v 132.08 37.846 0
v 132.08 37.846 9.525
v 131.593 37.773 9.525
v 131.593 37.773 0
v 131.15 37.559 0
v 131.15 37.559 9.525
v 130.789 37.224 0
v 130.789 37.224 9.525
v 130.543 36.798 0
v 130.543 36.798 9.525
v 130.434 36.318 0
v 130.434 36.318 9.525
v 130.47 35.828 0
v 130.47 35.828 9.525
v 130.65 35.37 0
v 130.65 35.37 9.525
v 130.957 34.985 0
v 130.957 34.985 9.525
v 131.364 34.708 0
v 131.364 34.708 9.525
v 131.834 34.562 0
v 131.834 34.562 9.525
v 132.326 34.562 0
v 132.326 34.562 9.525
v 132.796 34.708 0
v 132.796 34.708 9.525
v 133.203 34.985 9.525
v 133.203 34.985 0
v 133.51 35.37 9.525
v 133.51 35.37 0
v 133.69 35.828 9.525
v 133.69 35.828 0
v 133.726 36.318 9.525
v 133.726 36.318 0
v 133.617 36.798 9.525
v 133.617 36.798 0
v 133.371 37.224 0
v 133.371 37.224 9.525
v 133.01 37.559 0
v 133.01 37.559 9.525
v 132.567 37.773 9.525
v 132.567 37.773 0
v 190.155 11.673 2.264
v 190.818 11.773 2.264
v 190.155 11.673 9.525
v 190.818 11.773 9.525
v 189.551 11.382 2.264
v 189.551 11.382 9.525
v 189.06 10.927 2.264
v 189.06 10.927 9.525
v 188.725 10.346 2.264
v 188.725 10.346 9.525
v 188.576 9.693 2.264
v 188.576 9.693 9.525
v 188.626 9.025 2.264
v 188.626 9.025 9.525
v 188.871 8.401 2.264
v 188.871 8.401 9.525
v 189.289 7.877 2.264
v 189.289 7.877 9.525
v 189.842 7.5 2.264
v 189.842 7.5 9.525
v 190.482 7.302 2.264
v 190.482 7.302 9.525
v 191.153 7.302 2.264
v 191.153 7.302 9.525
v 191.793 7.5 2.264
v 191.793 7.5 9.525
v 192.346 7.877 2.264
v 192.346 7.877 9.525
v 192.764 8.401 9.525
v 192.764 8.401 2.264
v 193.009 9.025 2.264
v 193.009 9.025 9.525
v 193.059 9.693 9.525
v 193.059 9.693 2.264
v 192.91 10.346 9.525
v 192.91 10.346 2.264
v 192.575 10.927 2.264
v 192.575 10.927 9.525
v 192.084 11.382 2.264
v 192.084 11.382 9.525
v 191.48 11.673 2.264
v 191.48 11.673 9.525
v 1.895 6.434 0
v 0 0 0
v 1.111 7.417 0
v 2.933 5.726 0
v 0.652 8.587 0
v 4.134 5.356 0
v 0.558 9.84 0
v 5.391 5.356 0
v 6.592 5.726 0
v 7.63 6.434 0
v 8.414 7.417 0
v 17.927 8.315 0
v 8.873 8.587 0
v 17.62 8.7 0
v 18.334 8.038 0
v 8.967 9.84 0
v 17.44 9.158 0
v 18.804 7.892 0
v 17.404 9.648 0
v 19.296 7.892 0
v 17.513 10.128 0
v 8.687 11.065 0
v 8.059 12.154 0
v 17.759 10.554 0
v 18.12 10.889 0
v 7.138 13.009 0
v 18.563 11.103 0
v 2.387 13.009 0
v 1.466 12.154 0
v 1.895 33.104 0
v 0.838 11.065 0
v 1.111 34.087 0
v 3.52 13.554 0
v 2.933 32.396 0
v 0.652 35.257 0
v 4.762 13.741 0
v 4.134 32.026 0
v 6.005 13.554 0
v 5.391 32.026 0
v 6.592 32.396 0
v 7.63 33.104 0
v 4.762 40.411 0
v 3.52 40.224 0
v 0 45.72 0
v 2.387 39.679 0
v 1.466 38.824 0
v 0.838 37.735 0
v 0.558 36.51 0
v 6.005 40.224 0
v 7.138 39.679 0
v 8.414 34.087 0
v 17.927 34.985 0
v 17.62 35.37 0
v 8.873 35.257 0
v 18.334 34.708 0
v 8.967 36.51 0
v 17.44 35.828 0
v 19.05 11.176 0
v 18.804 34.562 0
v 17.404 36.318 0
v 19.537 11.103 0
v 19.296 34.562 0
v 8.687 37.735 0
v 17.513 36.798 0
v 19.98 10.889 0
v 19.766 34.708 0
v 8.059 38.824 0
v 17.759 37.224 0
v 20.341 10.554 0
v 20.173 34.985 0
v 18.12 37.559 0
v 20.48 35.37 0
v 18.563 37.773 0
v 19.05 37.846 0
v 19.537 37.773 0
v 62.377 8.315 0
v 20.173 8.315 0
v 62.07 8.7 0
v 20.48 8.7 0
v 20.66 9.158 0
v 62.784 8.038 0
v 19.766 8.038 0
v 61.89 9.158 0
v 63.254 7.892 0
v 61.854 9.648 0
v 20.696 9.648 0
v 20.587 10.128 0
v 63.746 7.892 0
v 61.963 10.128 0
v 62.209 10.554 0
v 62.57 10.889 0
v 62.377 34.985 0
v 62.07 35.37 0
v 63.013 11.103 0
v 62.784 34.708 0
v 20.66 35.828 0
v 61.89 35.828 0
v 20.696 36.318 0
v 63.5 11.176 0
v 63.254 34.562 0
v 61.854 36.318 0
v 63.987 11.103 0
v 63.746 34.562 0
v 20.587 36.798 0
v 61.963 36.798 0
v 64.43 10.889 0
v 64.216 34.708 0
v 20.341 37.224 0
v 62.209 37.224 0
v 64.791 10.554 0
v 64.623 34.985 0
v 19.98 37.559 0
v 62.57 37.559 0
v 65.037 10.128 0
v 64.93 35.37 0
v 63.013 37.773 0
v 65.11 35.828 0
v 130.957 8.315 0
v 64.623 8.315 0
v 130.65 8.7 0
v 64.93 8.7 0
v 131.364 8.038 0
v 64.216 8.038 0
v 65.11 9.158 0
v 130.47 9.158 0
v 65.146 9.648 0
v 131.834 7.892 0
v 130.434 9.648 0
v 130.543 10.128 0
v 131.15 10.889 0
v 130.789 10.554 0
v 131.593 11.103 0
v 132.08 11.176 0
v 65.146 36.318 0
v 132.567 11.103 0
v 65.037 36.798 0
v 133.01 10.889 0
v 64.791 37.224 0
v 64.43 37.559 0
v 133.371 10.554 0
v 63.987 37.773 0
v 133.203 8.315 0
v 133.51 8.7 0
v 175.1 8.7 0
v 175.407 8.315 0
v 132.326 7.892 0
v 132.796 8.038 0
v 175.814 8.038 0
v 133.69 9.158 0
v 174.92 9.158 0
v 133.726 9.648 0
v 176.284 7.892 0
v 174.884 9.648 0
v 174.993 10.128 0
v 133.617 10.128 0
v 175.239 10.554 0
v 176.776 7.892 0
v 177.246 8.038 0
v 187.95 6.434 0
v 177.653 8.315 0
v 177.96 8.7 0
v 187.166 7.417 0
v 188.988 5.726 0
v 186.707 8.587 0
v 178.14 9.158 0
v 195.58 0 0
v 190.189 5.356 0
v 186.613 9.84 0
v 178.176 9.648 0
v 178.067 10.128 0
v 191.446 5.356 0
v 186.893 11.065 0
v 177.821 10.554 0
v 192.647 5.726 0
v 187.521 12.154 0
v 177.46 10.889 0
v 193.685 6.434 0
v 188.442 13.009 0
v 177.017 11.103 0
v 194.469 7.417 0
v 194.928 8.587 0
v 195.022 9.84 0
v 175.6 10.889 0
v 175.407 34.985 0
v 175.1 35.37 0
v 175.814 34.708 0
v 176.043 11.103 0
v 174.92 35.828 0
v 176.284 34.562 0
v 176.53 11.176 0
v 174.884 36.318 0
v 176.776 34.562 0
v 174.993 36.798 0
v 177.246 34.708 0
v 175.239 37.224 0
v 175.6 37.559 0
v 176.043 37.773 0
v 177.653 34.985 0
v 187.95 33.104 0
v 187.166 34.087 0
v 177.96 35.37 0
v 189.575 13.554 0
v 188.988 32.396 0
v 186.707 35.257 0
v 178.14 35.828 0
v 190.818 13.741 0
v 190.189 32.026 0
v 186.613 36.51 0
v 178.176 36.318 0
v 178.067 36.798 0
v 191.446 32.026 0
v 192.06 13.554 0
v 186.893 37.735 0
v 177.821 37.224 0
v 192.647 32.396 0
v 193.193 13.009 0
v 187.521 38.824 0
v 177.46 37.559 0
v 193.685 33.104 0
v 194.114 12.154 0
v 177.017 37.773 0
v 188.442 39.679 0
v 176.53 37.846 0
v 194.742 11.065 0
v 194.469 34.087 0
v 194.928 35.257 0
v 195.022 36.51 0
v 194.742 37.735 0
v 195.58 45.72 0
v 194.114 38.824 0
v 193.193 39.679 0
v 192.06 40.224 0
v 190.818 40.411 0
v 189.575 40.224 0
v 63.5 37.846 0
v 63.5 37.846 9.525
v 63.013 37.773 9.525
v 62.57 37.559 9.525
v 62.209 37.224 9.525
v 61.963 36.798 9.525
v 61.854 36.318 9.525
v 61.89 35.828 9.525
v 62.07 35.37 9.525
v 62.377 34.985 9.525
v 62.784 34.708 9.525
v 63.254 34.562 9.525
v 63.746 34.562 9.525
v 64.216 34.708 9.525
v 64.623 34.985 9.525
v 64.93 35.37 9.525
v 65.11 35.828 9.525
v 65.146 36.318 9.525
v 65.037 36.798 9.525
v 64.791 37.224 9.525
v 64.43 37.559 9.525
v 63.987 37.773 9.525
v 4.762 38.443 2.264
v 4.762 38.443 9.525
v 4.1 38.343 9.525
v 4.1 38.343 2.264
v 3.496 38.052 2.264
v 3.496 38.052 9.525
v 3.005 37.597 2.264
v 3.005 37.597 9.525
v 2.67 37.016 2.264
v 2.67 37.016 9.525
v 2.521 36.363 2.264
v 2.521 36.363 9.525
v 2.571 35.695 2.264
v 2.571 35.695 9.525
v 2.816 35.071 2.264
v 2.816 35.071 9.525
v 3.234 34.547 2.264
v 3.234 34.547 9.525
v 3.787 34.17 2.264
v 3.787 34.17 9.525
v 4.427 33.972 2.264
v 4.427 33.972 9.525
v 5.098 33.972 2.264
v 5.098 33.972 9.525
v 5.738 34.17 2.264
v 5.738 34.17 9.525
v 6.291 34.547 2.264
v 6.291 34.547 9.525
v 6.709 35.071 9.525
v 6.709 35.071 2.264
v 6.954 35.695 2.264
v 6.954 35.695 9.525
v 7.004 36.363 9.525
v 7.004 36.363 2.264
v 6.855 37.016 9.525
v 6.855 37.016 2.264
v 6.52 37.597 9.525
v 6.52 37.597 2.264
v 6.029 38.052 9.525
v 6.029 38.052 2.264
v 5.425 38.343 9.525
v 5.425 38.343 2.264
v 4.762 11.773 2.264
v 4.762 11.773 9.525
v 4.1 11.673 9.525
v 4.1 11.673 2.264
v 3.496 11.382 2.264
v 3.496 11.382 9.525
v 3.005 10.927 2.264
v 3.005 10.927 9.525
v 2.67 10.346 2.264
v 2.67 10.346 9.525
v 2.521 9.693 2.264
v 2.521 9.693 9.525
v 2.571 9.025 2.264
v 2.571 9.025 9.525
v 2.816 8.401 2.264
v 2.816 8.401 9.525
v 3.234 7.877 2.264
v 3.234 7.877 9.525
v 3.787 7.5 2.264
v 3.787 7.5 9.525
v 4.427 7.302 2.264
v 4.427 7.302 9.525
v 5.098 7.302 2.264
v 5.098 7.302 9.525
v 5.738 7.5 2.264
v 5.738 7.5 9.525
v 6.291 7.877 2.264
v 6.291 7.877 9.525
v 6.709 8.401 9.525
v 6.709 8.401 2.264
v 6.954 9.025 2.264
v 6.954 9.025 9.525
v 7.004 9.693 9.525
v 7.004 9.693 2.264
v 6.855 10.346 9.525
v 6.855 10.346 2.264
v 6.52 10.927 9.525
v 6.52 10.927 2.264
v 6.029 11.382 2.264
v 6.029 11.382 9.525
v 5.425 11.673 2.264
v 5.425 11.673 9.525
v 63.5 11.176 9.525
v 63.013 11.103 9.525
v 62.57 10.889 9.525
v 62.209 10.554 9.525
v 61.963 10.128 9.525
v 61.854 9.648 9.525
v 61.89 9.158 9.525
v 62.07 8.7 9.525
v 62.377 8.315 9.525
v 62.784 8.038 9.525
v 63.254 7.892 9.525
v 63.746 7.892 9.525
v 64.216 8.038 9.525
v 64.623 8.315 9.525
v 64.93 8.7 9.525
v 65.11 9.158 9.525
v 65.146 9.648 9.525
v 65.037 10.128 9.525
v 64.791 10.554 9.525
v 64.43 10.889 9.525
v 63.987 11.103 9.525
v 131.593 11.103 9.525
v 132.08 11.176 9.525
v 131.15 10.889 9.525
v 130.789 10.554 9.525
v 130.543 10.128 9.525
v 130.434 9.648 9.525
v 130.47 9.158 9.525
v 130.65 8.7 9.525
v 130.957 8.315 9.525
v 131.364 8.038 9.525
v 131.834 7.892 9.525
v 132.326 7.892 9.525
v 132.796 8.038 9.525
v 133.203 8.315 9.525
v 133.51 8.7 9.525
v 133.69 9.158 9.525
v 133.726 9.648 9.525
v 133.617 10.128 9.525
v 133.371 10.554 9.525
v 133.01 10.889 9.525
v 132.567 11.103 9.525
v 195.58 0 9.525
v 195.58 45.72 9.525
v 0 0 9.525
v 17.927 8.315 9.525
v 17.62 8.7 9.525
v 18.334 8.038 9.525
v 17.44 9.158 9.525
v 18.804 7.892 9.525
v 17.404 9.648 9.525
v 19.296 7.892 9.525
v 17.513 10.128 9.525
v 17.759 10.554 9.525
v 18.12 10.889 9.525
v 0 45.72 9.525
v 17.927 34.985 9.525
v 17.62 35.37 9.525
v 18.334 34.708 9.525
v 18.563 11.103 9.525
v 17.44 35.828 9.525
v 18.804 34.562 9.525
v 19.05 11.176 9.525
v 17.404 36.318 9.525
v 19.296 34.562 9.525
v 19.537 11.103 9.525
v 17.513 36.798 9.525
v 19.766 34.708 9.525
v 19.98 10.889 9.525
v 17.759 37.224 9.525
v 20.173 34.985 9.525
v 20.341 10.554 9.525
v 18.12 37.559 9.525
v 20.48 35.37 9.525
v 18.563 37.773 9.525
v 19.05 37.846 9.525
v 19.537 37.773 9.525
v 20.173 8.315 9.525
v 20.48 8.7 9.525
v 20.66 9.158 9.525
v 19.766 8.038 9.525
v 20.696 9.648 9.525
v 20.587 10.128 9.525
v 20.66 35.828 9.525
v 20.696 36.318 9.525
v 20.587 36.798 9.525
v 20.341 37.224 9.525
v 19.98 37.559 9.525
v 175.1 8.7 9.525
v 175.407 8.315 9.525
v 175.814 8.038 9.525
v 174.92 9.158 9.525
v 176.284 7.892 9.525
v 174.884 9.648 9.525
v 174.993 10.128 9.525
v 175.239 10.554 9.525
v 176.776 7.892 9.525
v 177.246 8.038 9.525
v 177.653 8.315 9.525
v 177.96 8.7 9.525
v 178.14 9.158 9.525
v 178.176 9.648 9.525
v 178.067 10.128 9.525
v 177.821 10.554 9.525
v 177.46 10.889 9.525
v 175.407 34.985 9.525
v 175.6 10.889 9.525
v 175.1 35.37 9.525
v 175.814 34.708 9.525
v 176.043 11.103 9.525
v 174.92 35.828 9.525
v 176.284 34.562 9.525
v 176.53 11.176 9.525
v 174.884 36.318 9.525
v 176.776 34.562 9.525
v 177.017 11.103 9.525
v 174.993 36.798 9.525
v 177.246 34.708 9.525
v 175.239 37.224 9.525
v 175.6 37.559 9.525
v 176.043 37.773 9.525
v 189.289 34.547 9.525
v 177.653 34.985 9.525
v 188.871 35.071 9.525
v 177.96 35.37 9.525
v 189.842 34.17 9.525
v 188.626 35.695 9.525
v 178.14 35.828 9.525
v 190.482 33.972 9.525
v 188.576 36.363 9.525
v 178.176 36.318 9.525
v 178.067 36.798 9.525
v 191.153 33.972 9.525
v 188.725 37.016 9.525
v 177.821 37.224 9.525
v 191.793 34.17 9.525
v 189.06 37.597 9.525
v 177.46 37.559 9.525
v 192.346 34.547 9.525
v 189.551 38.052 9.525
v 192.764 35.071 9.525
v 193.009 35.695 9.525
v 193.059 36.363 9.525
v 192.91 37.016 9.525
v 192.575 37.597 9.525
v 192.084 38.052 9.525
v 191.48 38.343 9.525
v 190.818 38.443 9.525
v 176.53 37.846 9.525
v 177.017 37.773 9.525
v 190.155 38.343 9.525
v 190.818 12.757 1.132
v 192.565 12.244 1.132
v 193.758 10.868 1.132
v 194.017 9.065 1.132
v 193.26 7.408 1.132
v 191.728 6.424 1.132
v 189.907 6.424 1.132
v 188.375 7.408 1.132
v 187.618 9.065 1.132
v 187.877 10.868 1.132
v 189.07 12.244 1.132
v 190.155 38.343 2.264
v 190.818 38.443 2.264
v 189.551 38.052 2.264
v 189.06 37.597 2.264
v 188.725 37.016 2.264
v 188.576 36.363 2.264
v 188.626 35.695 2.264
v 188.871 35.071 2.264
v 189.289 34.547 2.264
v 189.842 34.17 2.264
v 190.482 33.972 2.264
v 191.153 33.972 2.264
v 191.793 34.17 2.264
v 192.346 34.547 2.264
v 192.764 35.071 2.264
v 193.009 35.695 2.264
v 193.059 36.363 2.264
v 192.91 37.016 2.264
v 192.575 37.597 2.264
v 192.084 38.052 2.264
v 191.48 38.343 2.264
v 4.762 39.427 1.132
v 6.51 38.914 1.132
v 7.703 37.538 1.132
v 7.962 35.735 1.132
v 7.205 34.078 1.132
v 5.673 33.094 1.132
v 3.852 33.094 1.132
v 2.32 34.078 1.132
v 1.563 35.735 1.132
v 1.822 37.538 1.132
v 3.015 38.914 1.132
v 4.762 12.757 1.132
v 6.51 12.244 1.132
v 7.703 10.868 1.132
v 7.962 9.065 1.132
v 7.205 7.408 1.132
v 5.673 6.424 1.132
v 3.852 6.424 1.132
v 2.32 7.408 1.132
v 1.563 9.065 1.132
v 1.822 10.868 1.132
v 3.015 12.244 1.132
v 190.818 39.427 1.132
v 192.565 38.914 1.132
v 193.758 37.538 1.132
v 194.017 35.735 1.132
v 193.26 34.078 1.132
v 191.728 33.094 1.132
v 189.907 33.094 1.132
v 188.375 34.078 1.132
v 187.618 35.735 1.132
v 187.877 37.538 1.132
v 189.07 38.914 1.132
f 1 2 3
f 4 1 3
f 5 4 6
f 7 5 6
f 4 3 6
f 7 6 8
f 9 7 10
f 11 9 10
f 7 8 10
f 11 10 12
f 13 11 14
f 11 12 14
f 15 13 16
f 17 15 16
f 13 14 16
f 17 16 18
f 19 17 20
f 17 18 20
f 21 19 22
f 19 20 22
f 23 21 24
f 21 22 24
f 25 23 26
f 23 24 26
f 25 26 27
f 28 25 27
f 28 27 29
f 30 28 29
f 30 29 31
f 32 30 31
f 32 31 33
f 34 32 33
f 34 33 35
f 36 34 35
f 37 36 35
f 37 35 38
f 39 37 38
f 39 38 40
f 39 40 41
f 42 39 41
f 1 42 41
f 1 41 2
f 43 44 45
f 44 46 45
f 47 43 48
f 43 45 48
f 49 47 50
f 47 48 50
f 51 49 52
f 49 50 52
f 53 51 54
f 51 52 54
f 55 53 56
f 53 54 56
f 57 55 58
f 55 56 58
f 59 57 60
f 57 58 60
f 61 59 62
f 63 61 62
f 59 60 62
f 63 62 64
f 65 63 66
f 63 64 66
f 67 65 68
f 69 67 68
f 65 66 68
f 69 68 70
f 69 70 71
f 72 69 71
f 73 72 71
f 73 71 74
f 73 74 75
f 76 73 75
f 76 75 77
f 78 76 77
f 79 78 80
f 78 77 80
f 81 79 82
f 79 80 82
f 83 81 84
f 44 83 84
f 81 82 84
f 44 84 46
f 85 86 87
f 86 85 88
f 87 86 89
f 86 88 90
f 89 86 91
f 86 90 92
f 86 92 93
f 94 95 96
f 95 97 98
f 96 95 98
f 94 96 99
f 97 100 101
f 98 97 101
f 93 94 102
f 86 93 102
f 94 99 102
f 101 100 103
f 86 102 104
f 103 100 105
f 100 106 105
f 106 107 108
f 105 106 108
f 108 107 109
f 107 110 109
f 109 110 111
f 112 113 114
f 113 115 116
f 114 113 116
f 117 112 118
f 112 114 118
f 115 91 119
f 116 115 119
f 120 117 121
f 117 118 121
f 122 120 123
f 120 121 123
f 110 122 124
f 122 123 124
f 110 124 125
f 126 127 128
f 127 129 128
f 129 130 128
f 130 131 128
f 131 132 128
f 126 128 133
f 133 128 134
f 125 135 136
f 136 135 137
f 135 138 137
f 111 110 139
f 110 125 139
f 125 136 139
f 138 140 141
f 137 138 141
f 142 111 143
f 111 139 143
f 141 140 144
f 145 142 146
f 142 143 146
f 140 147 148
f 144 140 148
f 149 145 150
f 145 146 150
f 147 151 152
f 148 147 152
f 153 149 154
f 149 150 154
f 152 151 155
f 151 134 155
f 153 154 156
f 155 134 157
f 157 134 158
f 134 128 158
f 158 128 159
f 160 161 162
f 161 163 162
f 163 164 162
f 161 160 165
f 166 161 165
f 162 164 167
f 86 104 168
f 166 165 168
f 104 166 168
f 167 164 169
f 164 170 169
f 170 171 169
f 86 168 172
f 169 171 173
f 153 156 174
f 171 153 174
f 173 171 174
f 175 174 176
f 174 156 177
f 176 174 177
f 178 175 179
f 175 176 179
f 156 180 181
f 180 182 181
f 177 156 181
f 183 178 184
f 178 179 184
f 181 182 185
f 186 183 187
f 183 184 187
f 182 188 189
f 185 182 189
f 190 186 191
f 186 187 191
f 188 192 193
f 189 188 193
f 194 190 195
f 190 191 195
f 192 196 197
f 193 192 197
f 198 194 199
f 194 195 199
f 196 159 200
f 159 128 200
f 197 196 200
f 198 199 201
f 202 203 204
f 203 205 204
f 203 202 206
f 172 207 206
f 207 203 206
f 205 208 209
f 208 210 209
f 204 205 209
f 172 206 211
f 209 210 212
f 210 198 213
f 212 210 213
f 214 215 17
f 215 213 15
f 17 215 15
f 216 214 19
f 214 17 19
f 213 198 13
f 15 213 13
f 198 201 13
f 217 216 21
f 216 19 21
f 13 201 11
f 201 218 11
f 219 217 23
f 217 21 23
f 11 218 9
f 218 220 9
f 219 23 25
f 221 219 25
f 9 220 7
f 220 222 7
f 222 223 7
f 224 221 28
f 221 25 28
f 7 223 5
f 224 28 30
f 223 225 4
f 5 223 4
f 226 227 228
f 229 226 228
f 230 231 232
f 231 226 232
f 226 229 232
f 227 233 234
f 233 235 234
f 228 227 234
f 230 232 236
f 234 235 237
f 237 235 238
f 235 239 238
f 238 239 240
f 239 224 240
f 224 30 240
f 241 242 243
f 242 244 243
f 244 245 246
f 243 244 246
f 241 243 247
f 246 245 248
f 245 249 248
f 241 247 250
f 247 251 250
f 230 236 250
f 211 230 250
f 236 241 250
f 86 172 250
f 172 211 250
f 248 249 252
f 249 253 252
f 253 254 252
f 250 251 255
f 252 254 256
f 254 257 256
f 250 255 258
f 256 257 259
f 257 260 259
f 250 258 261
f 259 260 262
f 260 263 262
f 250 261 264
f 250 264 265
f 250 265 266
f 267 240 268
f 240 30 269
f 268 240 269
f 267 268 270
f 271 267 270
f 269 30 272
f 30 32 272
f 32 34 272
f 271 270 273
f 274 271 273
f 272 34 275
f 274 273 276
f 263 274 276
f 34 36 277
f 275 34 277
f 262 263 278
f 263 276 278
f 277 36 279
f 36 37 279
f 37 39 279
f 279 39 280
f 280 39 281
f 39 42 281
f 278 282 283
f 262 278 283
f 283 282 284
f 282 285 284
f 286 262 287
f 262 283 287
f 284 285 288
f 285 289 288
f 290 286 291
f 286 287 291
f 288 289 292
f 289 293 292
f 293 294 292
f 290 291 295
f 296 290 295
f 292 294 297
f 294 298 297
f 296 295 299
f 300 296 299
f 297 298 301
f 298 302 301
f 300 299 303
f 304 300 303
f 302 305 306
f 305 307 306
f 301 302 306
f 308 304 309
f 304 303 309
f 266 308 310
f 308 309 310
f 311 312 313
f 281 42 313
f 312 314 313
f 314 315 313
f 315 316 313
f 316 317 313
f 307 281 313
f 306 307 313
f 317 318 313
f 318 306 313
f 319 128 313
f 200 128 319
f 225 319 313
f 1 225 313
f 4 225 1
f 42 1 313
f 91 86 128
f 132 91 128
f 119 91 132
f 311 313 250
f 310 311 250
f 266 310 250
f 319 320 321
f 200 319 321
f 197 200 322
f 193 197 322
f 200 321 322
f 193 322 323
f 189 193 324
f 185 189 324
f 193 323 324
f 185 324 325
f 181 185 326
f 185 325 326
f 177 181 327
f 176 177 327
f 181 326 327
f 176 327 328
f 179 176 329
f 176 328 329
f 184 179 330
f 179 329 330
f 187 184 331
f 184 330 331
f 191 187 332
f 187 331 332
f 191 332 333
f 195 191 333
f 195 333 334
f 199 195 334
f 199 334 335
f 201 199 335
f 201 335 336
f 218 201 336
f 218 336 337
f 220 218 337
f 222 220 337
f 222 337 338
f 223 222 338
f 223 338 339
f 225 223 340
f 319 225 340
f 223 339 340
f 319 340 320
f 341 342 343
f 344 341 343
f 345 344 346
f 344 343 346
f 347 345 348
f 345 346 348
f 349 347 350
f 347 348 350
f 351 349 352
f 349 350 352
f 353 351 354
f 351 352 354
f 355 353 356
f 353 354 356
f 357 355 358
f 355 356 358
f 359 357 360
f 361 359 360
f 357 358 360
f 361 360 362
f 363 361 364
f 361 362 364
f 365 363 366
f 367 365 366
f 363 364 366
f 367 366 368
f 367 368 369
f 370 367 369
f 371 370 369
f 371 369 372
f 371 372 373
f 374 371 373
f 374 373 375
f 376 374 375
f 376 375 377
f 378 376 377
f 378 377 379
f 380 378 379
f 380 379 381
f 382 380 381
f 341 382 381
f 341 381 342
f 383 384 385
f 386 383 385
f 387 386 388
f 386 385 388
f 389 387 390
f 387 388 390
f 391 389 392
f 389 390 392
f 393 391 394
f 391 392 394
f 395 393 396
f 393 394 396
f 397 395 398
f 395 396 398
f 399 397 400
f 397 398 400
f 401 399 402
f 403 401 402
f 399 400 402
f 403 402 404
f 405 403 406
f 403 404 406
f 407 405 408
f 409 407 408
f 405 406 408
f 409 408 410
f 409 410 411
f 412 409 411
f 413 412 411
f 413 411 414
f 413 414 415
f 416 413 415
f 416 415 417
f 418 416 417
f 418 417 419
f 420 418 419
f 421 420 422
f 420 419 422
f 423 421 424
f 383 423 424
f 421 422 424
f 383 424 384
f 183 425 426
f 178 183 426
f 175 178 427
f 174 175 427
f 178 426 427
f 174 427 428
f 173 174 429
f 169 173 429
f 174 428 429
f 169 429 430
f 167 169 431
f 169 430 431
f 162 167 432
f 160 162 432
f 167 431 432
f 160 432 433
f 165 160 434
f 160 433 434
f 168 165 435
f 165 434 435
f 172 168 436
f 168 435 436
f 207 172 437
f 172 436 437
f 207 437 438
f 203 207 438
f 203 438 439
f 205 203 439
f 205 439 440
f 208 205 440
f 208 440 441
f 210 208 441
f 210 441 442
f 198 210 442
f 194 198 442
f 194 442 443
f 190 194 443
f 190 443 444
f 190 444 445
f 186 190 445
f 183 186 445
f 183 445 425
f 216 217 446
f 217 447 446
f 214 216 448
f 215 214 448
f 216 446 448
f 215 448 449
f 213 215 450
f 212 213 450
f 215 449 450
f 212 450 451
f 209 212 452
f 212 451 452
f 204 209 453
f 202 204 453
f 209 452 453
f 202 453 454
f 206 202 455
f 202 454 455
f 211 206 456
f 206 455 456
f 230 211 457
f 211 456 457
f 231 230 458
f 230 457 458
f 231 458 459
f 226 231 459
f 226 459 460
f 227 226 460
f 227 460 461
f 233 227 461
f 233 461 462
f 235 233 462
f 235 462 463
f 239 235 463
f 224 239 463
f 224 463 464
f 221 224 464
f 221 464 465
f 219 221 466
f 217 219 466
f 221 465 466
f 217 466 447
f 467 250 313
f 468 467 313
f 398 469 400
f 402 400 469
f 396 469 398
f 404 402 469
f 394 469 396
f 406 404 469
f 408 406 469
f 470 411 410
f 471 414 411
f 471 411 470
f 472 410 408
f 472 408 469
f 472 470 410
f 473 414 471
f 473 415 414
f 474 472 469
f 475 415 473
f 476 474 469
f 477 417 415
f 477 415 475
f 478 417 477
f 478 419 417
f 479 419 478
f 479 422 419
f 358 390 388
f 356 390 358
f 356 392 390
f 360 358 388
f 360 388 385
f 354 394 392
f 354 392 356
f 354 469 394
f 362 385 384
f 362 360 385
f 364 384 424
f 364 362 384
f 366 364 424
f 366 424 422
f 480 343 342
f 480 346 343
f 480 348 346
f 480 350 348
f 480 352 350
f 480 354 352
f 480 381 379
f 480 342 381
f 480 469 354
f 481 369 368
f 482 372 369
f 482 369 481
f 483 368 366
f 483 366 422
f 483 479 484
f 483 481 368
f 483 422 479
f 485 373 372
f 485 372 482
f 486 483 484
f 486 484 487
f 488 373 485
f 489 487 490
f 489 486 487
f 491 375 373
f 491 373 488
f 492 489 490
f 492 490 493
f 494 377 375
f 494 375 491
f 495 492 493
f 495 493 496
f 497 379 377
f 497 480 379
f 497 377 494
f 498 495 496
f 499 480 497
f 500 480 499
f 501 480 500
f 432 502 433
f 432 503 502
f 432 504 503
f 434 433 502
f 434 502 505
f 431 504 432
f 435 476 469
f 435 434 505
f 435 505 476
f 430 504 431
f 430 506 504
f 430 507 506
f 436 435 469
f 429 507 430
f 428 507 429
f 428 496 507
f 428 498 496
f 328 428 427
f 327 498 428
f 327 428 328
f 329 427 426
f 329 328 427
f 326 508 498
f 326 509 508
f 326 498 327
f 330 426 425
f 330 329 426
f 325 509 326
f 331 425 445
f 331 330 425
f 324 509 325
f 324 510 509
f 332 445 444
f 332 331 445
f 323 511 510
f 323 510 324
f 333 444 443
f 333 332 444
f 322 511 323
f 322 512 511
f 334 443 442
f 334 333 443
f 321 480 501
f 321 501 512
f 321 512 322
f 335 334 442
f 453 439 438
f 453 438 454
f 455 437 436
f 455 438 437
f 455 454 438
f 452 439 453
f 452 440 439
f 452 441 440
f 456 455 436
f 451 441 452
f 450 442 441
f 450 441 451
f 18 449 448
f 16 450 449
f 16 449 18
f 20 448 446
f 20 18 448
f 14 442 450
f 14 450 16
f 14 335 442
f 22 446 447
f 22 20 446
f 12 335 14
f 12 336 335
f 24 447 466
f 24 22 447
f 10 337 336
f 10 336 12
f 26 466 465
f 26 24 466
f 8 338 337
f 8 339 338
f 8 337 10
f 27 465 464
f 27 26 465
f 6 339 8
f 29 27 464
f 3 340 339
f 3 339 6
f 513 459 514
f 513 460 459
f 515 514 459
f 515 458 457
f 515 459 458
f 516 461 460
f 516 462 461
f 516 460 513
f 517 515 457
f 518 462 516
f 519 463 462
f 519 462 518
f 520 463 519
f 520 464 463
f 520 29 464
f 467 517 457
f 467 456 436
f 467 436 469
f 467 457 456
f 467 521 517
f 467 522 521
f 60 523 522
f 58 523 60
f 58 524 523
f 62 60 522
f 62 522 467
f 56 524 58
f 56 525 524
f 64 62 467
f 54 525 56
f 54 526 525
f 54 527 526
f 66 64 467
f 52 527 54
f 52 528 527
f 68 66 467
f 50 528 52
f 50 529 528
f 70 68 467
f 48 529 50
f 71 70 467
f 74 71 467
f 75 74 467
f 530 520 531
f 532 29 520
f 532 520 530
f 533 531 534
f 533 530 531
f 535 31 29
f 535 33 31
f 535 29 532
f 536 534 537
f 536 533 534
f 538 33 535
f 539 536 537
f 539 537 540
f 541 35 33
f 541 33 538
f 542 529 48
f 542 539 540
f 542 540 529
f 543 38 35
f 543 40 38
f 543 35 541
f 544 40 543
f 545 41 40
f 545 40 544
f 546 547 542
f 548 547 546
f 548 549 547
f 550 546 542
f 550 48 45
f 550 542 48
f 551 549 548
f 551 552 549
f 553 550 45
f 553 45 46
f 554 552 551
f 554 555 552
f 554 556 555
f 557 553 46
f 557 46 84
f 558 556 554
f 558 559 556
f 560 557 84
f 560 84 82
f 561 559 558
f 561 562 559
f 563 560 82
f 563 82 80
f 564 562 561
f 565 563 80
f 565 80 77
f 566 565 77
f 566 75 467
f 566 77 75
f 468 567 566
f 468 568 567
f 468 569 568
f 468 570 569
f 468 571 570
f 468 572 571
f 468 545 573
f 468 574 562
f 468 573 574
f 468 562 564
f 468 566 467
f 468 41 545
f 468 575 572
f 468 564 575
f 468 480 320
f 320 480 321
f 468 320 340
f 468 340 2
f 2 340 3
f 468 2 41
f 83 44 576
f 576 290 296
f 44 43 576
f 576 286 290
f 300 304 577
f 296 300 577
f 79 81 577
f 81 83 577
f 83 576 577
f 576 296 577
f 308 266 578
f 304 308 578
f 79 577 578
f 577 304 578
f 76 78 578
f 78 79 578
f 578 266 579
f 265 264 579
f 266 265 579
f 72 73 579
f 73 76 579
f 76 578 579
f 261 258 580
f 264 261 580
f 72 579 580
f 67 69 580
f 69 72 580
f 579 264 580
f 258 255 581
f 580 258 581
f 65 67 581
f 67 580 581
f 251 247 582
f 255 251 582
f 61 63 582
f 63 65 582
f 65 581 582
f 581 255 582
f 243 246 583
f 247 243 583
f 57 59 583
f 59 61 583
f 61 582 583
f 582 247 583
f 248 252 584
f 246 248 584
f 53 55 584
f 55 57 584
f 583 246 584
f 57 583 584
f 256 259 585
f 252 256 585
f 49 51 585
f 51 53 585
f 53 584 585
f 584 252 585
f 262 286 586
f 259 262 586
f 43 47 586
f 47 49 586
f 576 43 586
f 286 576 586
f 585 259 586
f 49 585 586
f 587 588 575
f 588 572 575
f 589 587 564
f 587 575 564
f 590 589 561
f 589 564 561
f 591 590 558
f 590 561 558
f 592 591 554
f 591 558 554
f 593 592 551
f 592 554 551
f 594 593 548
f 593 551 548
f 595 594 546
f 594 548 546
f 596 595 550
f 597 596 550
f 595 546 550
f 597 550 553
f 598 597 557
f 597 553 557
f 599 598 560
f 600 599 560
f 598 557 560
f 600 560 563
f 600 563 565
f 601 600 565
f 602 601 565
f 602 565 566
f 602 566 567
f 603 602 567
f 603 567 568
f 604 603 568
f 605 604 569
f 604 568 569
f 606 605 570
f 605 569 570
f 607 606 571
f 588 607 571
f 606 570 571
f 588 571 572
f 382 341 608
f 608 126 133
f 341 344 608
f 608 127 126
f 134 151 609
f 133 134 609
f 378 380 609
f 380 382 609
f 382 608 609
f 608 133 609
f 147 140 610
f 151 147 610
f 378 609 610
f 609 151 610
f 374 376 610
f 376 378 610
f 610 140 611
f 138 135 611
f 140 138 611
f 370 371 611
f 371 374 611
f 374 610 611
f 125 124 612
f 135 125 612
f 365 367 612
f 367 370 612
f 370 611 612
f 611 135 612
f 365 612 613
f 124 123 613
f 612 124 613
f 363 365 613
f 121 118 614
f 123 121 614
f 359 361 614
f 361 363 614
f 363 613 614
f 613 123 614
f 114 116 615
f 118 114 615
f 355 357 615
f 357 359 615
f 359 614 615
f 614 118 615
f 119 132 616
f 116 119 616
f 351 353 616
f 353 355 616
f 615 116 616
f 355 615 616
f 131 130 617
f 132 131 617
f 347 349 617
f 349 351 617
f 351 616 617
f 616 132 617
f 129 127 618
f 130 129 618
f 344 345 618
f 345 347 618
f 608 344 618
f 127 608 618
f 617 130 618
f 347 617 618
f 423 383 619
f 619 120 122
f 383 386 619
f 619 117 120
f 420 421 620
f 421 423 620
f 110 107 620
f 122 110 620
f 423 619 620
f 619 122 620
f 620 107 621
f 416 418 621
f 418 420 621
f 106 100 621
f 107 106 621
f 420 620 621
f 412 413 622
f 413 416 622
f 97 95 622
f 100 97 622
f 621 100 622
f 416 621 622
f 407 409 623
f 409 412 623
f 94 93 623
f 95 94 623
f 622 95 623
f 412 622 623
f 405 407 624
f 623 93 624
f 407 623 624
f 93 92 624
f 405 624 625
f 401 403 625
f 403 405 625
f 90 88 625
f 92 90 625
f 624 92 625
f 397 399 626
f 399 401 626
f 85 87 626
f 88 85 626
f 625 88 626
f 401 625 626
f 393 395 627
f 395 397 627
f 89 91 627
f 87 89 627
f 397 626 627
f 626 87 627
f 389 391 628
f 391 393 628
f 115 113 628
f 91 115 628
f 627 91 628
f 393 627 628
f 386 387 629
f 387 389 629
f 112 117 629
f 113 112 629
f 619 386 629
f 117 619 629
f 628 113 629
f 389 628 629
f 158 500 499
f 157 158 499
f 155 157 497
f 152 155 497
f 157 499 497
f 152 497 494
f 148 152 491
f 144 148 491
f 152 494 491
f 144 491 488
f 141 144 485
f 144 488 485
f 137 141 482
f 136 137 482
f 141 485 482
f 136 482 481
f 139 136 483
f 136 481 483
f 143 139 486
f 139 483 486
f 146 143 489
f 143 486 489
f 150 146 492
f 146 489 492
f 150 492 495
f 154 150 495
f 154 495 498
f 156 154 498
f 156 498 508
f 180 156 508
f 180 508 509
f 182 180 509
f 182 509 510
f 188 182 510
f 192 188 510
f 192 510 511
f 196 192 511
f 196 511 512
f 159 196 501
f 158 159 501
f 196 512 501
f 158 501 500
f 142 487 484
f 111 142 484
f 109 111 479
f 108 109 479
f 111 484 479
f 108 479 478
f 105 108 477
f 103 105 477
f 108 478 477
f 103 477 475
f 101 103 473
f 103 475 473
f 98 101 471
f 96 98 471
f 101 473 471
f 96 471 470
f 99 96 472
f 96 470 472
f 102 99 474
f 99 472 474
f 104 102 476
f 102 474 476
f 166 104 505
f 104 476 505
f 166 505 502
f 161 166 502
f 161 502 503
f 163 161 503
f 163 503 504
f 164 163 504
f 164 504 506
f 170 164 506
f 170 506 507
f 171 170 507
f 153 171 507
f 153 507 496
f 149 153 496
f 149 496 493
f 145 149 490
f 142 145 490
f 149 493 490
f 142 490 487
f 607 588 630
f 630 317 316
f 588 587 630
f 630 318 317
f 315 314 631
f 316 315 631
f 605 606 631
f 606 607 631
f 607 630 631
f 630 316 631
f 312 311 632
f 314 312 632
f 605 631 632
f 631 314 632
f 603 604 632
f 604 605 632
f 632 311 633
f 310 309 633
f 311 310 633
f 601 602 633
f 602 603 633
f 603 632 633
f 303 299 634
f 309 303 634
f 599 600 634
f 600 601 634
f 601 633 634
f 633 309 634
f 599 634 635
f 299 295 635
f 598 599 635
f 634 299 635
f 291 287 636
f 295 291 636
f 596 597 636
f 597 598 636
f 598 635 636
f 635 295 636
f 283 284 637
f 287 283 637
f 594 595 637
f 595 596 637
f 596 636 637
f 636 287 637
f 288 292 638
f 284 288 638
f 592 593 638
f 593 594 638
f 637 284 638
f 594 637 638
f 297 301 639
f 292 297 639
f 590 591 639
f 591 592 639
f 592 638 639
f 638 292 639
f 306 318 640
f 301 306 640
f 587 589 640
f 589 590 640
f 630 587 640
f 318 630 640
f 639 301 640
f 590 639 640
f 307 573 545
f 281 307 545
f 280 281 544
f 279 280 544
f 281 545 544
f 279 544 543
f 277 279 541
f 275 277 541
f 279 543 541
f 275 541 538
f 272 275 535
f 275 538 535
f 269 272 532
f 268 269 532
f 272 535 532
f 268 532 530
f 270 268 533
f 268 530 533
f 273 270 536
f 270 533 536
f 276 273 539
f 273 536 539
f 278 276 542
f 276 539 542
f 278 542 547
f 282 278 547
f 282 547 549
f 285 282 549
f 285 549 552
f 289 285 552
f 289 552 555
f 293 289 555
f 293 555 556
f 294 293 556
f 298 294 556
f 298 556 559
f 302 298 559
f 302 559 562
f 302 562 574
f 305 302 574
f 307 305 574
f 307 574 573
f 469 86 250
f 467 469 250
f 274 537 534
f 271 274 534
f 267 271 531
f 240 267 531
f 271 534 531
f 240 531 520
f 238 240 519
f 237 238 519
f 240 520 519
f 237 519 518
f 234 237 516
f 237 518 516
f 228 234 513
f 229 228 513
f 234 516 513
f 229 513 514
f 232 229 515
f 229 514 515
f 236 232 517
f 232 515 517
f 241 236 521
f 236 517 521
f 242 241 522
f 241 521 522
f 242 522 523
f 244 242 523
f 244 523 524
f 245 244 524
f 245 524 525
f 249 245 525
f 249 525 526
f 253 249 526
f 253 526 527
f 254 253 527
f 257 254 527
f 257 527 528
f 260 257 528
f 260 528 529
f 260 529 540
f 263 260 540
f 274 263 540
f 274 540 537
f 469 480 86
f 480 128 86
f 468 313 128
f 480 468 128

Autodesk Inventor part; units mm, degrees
ref_plane "YZ Plane" through (0, 0, 0) normal (1, 0, 0) x (0, 1, 0)
ref_plane "XZ Plane" through (0, 0, 0) normal (0, 1, 0) x (-1, 0, 0)
ref_plane "XY Plane" through (0, 0, 0) normal (0, 0, 1) x (1, 0, 0)
sketch "Sketch1" plane through (0, 0, 0) normal (0, 0, 1) x (1, 0, 0)
  line L0 (0, 0) -> (195.58, 0)
  line L1 (195.58, 0) -> (195.58, 45.72)
  line L2 (195.58, 45.72) -> (0, 45.72)
  line L3 (0, 45.72) -> (0, 0)
  dimension "d0" = 45.72
  dimension "d1" = 195.58
extrude "Extrusion1" add sketch "Sketch1" along normal blind 9.525
sketch "Sketch2" plane through (0, 0, 0) normal (0, 0, -1) x (-1, 0, 0)
  circle A0 centre (-176.53, 36.195) radius 4.4323 projected
  circle A1 centre (-132.08, 36.195) radius 4.4323 projected
  circle A2 centre (-132.08, 9.525) radius 4.4323 projected
  circle A3 centre (-176.53, 9.525) radius 4.4323 projected
  circle A4 centre (-63.5, 36.195) radius 4.4323 projected
  circle A5 centre (-19.05, 36.195) radius 4.4323 projected
  circle A6 centre (-19.05, 9.525) radius 4.4323 projected
  circle A7 centre (-63.5, 9.525) radius 4.4323 projected
hole "Hole1" at (176.53, 36.195, 0) at (132.08, 36.195, 0) at (132.08, 9.525, 0) at (176.53, 9.525, 0) at (63.5, 9.525, 0) at (63.5, 36.195, 0) at (19.05, 36.195, 0) at (19.05, 9.525, 0) direction (0, 0, 1) diameter 3.302 end through all thread size "8-32 UNC" class "2B" standard "ANSI Unified Screw Threads"
sketch "Sketch3" plane through (0, 0, 0) normal (0, 0, -1) x (-1, 0, 0)
  circle A0 centre (-19.05, 9.525) radius 1.651 projected
  circle A1 centre (-19.05, 36.195) radius 1.651 projected
  line L0 (-195.58, 46.9392) -> (-195.58, -0.0508)
  line L1 (-186.055, -0.0508) -> (-195.58, -0.0508)
  line L2 (-186.055, -0.0508) -> (-186.055, 46.9392)
  line L3 (-195.58, 46.9392) -> (-186.055, 46.9392)
  line L4 (0, 46.9392) -> (0, -0.0508)
  line L5 (0, 46.9392) -> (-9.525, 46.9392)
  line L6 (-9.525, -0.0508) -> (-9.525, 46.9392)
  line L7 (-9.525, -0.0508) -> (0, -0.0508)
  circle A2 centre (-4.7625, 36.195) radius 1.651
  circle A3 centre (-4.7625, 9.525) radius 1.651
  line L8 (-195.58, 45.72) -> (0, 45.72) projected
  point P0 (-4.7625, 9.525)
  point P1 (-4.7625, 36.195)
  point P2 (-190.8175, 36.195)
  point P3 (-190.8175, 9.525)
  dimension "d18" = 9.525
hole "Hole2" at (4.7625, 9.525, 0) at (4.7625, 36.195, 0) at (190.8175, 36.195, 0) at (190.8175, 9.525, 0) direction (0, 0, 1) diameter 4.4958 end through all countersink diameter 8.4328 countersink angle 82 clearance for "Flat Head Machine Screw (82)" size "#8" standard "Ansi Unified Screw Threads"
properties part number "MagnetPlate" material "Aluminum-6061"
